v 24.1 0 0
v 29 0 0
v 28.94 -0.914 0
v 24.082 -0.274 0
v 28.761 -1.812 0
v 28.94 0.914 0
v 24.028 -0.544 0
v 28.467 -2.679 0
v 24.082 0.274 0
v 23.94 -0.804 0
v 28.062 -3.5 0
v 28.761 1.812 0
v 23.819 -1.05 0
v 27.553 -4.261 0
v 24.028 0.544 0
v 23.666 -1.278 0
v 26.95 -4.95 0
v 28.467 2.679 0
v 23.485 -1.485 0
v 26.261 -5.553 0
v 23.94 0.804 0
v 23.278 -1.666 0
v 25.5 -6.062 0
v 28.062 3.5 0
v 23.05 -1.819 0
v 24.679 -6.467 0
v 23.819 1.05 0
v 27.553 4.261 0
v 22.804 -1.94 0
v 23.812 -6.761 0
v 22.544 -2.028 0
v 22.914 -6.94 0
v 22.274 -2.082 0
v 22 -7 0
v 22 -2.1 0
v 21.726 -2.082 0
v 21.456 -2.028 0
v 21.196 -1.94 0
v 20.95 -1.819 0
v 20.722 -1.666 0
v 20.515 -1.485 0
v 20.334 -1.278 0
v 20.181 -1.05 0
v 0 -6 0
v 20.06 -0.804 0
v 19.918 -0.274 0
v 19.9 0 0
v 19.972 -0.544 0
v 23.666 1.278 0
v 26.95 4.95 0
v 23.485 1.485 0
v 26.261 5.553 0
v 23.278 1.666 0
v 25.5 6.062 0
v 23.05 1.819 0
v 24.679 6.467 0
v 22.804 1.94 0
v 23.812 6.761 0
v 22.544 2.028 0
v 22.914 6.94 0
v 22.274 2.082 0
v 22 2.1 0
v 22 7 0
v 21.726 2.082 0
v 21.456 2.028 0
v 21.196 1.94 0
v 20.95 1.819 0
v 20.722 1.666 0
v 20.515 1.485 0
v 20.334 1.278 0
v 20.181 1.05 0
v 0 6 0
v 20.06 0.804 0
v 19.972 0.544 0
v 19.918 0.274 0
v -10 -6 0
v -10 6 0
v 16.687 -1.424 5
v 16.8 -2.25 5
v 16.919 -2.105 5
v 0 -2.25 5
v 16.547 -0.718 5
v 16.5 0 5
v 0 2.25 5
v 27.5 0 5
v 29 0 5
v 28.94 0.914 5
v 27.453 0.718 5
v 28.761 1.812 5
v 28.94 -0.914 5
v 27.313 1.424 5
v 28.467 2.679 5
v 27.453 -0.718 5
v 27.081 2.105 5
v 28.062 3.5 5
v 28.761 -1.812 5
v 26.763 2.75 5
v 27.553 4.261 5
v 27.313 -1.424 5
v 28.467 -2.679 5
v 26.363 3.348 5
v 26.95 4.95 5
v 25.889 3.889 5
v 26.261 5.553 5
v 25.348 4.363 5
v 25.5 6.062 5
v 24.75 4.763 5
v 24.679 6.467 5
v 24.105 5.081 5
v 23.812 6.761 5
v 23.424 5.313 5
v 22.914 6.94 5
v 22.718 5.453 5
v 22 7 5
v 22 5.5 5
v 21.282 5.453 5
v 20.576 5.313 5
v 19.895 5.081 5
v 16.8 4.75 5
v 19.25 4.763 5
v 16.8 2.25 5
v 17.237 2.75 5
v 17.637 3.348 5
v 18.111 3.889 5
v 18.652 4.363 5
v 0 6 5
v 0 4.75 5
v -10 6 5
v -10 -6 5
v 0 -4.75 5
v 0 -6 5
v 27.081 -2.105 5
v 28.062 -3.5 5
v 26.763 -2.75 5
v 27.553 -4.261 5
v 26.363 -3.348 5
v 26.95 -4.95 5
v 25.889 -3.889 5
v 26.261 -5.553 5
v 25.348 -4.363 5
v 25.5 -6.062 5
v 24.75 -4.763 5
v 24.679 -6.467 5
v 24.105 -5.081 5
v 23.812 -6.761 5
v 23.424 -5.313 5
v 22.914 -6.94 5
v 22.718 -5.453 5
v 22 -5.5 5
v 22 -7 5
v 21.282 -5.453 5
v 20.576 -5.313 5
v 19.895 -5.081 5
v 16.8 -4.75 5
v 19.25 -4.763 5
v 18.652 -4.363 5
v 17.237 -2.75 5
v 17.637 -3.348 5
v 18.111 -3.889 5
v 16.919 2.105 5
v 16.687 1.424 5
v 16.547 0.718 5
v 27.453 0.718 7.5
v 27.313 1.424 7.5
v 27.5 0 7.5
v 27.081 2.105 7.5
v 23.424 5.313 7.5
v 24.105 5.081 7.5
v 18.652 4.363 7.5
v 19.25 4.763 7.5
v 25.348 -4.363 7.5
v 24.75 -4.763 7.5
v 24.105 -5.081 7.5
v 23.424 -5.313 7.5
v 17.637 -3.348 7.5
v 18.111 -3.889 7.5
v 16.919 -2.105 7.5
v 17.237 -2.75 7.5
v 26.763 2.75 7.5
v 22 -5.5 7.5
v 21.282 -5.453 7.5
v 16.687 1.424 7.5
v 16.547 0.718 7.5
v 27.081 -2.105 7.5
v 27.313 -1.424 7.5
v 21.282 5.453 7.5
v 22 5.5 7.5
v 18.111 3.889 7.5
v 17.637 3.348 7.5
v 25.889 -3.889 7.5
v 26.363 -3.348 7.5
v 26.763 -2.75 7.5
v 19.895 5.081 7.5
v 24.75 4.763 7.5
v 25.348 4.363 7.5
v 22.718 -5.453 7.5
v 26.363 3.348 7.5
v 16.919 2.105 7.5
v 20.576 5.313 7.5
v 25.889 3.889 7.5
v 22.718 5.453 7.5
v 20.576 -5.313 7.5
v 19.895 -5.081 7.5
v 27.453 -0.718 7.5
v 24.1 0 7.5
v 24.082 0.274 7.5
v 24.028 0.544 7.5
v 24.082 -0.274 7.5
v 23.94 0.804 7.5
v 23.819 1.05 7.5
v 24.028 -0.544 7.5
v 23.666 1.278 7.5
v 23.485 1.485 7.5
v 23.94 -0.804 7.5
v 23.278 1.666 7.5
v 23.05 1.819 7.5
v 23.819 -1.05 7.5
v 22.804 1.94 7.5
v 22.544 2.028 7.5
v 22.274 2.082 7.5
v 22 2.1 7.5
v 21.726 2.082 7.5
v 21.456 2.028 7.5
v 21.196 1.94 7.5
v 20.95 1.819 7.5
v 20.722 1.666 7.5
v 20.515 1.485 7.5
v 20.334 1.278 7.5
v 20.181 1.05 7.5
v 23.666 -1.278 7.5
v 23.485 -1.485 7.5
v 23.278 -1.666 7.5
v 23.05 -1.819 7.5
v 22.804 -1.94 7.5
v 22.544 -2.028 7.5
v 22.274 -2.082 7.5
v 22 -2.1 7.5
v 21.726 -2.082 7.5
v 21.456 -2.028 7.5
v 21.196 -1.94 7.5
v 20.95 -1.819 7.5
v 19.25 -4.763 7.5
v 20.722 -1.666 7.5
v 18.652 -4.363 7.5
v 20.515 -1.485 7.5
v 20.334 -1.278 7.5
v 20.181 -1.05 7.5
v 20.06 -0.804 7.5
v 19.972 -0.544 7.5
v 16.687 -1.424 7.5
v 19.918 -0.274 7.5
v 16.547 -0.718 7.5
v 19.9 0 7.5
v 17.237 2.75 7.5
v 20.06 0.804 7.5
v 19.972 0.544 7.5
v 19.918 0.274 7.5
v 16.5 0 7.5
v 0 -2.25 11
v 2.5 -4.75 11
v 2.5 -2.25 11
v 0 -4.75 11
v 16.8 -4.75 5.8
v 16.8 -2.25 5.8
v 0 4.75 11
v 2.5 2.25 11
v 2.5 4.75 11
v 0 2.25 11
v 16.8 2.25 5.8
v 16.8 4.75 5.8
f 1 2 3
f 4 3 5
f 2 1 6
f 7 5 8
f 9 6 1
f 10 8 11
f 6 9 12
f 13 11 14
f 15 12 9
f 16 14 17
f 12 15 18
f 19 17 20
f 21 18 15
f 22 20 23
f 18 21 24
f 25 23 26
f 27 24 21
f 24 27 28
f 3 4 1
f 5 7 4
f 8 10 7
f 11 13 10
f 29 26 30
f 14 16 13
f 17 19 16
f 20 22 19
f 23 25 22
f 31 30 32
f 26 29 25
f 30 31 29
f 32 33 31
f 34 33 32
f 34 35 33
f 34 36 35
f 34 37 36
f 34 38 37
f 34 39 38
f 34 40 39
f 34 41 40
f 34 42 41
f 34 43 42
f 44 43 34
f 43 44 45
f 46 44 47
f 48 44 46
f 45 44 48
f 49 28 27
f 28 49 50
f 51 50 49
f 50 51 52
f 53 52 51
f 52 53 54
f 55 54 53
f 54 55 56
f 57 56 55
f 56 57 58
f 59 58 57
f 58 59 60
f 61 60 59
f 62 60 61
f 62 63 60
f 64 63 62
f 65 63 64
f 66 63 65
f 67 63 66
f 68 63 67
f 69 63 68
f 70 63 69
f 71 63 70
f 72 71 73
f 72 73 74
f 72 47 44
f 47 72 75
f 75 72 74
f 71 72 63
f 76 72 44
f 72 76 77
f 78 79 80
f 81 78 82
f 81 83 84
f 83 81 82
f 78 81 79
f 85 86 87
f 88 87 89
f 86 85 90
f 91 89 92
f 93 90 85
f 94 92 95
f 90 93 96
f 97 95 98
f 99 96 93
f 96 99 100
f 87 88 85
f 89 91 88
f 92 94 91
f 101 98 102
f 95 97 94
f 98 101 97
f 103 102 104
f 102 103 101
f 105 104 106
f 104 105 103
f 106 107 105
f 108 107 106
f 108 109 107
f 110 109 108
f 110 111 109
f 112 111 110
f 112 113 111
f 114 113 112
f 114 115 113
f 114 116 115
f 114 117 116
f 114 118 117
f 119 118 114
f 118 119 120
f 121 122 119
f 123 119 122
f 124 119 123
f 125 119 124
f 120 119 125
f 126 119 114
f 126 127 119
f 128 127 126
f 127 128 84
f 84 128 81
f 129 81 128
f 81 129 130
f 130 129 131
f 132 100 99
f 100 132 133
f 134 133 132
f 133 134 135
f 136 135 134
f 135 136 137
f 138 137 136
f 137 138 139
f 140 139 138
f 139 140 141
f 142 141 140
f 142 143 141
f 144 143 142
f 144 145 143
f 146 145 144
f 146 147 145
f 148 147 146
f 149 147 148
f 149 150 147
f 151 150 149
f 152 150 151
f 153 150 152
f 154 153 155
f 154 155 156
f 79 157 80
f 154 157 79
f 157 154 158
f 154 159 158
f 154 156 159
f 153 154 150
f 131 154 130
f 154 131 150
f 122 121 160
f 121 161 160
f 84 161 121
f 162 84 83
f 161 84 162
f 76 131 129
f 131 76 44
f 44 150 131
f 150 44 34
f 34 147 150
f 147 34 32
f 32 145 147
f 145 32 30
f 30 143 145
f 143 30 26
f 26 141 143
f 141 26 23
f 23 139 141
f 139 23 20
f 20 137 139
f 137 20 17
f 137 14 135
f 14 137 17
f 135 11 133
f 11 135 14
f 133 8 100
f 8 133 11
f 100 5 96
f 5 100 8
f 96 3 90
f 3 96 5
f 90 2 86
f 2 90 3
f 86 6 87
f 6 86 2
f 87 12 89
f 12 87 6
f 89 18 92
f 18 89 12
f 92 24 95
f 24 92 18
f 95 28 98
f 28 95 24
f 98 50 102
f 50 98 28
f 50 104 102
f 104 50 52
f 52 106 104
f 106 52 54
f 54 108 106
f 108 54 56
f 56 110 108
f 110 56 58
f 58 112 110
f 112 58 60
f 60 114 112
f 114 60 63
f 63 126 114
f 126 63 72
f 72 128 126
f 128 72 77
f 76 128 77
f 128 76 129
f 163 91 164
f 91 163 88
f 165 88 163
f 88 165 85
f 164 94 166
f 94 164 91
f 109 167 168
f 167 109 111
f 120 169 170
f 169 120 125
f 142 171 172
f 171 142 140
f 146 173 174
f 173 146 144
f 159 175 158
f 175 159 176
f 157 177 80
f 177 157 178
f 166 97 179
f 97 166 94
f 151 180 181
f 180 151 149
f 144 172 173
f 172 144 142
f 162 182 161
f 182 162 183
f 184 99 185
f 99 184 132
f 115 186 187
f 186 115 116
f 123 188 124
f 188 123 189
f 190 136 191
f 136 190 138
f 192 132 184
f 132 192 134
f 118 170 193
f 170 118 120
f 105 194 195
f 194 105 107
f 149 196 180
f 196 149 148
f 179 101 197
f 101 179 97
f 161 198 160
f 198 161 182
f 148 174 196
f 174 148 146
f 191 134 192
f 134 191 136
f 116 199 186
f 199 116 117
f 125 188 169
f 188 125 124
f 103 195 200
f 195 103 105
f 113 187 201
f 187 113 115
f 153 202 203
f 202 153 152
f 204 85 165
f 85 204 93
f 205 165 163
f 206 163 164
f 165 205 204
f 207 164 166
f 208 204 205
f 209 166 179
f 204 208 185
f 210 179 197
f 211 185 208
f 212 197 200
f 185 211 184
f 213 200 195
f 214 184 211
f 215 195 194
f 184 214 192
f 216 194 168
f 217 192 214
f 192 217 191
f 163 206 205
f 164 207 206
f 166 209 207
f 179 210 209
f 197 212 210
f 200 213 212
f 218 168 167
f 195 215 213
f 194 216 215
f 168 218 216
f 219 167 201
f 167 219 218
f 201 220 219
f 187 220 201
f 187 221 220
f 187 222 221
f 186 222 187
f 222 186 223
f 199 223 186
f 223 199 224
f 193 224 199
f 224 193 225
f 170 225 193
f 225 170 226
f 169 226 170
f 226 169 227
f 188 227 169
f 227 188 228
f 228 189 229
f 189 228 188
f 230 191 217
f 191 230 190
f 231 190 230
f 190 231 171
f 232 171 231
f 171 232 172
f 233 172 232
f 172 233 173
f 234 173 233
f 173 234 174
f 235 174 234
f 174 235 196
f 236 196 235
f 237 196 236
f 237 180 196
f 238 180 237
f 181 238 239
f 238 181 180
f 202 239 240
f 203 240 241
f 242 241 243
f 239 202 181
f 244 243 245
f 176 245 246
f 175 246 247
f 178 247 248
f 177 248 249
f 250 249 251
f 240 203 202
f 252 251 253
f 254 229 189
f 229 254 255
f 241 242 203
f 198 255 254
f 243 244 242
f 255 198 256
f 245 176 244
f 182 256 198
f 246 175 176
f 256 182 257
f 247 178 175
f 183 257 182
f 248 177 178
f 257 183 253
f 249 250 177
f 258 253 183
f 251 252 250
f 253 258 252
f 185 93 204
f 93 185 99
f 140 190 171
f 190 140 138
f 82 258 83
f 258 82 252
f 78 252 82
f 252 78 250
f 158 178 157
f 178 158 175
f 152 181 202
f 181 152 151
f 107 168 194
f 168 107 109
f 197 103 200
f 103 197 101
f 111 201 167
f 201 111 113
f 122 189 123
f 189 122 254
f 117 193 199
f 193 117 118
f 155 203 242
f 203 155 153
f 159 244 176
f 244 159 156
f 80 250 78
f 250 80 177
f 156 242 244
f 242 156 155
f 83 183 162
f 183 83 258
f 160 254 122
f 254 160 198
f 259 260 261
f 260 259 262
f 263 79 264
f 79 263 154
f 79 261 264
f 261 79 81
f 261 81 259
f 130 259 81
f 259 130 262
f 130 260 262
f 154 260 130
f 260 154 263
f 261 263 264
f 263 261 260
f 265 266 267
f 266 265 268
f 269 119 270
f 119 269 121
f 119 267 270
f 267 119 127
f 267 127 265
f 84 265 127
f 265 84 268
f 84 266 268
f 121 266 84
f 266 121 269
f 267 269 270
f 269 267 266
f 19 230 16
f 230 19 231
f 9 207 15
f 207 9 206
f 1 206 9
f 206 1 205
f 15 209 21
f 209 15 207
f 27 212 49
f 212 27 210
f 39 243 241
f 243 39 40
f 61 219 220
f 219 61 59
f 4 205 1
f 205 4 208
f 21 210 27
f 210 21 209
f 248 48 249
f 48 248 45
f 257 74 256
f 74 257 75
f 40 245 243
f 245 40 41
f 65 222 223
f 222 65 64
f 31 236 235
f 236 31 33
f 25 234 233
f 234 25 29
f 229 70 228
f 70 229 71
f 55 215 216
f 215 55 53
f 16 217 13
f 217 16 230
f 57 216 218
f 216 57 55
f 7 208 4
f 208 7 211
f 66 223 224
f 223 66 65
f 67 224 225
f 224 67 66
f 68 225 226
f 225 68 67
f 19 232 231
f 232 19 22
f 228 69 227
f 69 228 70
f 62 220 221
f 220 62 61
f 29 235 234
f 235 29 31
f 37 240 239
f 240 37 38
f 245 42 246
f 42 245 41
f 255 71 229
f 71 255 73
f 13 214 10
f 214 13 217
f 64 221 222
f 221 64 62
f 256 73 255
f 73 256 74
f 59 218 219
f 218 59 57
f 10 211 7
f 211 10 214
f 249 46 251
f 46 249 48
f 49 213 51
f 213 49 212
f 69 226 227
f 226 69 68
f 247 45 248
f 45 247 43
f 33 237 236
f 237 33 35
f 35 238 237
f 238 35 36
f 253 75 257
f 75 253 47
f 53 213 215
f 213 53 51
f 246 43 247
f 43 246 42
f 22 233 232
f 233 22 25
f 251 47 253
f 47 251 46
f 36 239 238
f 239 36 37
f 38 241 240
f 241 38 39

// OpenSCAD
// Rounded external mount ear with boss, clearance hole, neck, and gusset.

$fn = 48;

ear_length = 22;
ear_width = 14;
ear_thickness = 5;
mount_hole_diameter = 4.2;
boss_outer_diameter = 11;
boss_height = 2.5;
neck_width = 12;
neck_length = 10;
gusset_thickness = 2.5;
gusset_height = 6;

module rounded_ear_2d() {
    hull() {
        translate([ear_length, 0]) circle(d = ear_width);
        translate([0, -neck_width / 2]) square([0.5, neck_width]);
    }
}

module ear_body() {
    linear_extrude(height = ear_thickness)
        union() {
            rounded_ear_2d();
            translate([-neck_length, -neck_width / 2])
                square([neck_length + 1, neck_width]);
        }
}

module boss() {
    translate([ear_length, 0, ear_thickness])
        cylinder(h = boss_height, d = boss_outer_diameter);
}

module hole_cut() {
    translate([ear_length, 0, -0.5])
        cylinder(h = ear_thickness + boss_height + 1.0, d = mount_hole_diameter);
}

module gusset(y) {
    hull() {
        translate([0, y - gusset_thickness / 2, ear_thickness])
            cube([gusset_thickness, gusset_thickness, gusset_height]);
        translate([ear_length * 0.65, y - gusset_thickness / 2, ear_thickness])
            cube([gusset_thickness, gusset_thickness, 0.8]);
    }
}

module rounded_mount_ear() {
    difference() {
        union() {
            ear_body();
            boss();
            gusset(-neck_width / 2 + gusset_thickness);
            gusset(neck_width / 2 - gusset_thickness);
        }
        hole_cut();
    }
}

rounded_mount_ear();
